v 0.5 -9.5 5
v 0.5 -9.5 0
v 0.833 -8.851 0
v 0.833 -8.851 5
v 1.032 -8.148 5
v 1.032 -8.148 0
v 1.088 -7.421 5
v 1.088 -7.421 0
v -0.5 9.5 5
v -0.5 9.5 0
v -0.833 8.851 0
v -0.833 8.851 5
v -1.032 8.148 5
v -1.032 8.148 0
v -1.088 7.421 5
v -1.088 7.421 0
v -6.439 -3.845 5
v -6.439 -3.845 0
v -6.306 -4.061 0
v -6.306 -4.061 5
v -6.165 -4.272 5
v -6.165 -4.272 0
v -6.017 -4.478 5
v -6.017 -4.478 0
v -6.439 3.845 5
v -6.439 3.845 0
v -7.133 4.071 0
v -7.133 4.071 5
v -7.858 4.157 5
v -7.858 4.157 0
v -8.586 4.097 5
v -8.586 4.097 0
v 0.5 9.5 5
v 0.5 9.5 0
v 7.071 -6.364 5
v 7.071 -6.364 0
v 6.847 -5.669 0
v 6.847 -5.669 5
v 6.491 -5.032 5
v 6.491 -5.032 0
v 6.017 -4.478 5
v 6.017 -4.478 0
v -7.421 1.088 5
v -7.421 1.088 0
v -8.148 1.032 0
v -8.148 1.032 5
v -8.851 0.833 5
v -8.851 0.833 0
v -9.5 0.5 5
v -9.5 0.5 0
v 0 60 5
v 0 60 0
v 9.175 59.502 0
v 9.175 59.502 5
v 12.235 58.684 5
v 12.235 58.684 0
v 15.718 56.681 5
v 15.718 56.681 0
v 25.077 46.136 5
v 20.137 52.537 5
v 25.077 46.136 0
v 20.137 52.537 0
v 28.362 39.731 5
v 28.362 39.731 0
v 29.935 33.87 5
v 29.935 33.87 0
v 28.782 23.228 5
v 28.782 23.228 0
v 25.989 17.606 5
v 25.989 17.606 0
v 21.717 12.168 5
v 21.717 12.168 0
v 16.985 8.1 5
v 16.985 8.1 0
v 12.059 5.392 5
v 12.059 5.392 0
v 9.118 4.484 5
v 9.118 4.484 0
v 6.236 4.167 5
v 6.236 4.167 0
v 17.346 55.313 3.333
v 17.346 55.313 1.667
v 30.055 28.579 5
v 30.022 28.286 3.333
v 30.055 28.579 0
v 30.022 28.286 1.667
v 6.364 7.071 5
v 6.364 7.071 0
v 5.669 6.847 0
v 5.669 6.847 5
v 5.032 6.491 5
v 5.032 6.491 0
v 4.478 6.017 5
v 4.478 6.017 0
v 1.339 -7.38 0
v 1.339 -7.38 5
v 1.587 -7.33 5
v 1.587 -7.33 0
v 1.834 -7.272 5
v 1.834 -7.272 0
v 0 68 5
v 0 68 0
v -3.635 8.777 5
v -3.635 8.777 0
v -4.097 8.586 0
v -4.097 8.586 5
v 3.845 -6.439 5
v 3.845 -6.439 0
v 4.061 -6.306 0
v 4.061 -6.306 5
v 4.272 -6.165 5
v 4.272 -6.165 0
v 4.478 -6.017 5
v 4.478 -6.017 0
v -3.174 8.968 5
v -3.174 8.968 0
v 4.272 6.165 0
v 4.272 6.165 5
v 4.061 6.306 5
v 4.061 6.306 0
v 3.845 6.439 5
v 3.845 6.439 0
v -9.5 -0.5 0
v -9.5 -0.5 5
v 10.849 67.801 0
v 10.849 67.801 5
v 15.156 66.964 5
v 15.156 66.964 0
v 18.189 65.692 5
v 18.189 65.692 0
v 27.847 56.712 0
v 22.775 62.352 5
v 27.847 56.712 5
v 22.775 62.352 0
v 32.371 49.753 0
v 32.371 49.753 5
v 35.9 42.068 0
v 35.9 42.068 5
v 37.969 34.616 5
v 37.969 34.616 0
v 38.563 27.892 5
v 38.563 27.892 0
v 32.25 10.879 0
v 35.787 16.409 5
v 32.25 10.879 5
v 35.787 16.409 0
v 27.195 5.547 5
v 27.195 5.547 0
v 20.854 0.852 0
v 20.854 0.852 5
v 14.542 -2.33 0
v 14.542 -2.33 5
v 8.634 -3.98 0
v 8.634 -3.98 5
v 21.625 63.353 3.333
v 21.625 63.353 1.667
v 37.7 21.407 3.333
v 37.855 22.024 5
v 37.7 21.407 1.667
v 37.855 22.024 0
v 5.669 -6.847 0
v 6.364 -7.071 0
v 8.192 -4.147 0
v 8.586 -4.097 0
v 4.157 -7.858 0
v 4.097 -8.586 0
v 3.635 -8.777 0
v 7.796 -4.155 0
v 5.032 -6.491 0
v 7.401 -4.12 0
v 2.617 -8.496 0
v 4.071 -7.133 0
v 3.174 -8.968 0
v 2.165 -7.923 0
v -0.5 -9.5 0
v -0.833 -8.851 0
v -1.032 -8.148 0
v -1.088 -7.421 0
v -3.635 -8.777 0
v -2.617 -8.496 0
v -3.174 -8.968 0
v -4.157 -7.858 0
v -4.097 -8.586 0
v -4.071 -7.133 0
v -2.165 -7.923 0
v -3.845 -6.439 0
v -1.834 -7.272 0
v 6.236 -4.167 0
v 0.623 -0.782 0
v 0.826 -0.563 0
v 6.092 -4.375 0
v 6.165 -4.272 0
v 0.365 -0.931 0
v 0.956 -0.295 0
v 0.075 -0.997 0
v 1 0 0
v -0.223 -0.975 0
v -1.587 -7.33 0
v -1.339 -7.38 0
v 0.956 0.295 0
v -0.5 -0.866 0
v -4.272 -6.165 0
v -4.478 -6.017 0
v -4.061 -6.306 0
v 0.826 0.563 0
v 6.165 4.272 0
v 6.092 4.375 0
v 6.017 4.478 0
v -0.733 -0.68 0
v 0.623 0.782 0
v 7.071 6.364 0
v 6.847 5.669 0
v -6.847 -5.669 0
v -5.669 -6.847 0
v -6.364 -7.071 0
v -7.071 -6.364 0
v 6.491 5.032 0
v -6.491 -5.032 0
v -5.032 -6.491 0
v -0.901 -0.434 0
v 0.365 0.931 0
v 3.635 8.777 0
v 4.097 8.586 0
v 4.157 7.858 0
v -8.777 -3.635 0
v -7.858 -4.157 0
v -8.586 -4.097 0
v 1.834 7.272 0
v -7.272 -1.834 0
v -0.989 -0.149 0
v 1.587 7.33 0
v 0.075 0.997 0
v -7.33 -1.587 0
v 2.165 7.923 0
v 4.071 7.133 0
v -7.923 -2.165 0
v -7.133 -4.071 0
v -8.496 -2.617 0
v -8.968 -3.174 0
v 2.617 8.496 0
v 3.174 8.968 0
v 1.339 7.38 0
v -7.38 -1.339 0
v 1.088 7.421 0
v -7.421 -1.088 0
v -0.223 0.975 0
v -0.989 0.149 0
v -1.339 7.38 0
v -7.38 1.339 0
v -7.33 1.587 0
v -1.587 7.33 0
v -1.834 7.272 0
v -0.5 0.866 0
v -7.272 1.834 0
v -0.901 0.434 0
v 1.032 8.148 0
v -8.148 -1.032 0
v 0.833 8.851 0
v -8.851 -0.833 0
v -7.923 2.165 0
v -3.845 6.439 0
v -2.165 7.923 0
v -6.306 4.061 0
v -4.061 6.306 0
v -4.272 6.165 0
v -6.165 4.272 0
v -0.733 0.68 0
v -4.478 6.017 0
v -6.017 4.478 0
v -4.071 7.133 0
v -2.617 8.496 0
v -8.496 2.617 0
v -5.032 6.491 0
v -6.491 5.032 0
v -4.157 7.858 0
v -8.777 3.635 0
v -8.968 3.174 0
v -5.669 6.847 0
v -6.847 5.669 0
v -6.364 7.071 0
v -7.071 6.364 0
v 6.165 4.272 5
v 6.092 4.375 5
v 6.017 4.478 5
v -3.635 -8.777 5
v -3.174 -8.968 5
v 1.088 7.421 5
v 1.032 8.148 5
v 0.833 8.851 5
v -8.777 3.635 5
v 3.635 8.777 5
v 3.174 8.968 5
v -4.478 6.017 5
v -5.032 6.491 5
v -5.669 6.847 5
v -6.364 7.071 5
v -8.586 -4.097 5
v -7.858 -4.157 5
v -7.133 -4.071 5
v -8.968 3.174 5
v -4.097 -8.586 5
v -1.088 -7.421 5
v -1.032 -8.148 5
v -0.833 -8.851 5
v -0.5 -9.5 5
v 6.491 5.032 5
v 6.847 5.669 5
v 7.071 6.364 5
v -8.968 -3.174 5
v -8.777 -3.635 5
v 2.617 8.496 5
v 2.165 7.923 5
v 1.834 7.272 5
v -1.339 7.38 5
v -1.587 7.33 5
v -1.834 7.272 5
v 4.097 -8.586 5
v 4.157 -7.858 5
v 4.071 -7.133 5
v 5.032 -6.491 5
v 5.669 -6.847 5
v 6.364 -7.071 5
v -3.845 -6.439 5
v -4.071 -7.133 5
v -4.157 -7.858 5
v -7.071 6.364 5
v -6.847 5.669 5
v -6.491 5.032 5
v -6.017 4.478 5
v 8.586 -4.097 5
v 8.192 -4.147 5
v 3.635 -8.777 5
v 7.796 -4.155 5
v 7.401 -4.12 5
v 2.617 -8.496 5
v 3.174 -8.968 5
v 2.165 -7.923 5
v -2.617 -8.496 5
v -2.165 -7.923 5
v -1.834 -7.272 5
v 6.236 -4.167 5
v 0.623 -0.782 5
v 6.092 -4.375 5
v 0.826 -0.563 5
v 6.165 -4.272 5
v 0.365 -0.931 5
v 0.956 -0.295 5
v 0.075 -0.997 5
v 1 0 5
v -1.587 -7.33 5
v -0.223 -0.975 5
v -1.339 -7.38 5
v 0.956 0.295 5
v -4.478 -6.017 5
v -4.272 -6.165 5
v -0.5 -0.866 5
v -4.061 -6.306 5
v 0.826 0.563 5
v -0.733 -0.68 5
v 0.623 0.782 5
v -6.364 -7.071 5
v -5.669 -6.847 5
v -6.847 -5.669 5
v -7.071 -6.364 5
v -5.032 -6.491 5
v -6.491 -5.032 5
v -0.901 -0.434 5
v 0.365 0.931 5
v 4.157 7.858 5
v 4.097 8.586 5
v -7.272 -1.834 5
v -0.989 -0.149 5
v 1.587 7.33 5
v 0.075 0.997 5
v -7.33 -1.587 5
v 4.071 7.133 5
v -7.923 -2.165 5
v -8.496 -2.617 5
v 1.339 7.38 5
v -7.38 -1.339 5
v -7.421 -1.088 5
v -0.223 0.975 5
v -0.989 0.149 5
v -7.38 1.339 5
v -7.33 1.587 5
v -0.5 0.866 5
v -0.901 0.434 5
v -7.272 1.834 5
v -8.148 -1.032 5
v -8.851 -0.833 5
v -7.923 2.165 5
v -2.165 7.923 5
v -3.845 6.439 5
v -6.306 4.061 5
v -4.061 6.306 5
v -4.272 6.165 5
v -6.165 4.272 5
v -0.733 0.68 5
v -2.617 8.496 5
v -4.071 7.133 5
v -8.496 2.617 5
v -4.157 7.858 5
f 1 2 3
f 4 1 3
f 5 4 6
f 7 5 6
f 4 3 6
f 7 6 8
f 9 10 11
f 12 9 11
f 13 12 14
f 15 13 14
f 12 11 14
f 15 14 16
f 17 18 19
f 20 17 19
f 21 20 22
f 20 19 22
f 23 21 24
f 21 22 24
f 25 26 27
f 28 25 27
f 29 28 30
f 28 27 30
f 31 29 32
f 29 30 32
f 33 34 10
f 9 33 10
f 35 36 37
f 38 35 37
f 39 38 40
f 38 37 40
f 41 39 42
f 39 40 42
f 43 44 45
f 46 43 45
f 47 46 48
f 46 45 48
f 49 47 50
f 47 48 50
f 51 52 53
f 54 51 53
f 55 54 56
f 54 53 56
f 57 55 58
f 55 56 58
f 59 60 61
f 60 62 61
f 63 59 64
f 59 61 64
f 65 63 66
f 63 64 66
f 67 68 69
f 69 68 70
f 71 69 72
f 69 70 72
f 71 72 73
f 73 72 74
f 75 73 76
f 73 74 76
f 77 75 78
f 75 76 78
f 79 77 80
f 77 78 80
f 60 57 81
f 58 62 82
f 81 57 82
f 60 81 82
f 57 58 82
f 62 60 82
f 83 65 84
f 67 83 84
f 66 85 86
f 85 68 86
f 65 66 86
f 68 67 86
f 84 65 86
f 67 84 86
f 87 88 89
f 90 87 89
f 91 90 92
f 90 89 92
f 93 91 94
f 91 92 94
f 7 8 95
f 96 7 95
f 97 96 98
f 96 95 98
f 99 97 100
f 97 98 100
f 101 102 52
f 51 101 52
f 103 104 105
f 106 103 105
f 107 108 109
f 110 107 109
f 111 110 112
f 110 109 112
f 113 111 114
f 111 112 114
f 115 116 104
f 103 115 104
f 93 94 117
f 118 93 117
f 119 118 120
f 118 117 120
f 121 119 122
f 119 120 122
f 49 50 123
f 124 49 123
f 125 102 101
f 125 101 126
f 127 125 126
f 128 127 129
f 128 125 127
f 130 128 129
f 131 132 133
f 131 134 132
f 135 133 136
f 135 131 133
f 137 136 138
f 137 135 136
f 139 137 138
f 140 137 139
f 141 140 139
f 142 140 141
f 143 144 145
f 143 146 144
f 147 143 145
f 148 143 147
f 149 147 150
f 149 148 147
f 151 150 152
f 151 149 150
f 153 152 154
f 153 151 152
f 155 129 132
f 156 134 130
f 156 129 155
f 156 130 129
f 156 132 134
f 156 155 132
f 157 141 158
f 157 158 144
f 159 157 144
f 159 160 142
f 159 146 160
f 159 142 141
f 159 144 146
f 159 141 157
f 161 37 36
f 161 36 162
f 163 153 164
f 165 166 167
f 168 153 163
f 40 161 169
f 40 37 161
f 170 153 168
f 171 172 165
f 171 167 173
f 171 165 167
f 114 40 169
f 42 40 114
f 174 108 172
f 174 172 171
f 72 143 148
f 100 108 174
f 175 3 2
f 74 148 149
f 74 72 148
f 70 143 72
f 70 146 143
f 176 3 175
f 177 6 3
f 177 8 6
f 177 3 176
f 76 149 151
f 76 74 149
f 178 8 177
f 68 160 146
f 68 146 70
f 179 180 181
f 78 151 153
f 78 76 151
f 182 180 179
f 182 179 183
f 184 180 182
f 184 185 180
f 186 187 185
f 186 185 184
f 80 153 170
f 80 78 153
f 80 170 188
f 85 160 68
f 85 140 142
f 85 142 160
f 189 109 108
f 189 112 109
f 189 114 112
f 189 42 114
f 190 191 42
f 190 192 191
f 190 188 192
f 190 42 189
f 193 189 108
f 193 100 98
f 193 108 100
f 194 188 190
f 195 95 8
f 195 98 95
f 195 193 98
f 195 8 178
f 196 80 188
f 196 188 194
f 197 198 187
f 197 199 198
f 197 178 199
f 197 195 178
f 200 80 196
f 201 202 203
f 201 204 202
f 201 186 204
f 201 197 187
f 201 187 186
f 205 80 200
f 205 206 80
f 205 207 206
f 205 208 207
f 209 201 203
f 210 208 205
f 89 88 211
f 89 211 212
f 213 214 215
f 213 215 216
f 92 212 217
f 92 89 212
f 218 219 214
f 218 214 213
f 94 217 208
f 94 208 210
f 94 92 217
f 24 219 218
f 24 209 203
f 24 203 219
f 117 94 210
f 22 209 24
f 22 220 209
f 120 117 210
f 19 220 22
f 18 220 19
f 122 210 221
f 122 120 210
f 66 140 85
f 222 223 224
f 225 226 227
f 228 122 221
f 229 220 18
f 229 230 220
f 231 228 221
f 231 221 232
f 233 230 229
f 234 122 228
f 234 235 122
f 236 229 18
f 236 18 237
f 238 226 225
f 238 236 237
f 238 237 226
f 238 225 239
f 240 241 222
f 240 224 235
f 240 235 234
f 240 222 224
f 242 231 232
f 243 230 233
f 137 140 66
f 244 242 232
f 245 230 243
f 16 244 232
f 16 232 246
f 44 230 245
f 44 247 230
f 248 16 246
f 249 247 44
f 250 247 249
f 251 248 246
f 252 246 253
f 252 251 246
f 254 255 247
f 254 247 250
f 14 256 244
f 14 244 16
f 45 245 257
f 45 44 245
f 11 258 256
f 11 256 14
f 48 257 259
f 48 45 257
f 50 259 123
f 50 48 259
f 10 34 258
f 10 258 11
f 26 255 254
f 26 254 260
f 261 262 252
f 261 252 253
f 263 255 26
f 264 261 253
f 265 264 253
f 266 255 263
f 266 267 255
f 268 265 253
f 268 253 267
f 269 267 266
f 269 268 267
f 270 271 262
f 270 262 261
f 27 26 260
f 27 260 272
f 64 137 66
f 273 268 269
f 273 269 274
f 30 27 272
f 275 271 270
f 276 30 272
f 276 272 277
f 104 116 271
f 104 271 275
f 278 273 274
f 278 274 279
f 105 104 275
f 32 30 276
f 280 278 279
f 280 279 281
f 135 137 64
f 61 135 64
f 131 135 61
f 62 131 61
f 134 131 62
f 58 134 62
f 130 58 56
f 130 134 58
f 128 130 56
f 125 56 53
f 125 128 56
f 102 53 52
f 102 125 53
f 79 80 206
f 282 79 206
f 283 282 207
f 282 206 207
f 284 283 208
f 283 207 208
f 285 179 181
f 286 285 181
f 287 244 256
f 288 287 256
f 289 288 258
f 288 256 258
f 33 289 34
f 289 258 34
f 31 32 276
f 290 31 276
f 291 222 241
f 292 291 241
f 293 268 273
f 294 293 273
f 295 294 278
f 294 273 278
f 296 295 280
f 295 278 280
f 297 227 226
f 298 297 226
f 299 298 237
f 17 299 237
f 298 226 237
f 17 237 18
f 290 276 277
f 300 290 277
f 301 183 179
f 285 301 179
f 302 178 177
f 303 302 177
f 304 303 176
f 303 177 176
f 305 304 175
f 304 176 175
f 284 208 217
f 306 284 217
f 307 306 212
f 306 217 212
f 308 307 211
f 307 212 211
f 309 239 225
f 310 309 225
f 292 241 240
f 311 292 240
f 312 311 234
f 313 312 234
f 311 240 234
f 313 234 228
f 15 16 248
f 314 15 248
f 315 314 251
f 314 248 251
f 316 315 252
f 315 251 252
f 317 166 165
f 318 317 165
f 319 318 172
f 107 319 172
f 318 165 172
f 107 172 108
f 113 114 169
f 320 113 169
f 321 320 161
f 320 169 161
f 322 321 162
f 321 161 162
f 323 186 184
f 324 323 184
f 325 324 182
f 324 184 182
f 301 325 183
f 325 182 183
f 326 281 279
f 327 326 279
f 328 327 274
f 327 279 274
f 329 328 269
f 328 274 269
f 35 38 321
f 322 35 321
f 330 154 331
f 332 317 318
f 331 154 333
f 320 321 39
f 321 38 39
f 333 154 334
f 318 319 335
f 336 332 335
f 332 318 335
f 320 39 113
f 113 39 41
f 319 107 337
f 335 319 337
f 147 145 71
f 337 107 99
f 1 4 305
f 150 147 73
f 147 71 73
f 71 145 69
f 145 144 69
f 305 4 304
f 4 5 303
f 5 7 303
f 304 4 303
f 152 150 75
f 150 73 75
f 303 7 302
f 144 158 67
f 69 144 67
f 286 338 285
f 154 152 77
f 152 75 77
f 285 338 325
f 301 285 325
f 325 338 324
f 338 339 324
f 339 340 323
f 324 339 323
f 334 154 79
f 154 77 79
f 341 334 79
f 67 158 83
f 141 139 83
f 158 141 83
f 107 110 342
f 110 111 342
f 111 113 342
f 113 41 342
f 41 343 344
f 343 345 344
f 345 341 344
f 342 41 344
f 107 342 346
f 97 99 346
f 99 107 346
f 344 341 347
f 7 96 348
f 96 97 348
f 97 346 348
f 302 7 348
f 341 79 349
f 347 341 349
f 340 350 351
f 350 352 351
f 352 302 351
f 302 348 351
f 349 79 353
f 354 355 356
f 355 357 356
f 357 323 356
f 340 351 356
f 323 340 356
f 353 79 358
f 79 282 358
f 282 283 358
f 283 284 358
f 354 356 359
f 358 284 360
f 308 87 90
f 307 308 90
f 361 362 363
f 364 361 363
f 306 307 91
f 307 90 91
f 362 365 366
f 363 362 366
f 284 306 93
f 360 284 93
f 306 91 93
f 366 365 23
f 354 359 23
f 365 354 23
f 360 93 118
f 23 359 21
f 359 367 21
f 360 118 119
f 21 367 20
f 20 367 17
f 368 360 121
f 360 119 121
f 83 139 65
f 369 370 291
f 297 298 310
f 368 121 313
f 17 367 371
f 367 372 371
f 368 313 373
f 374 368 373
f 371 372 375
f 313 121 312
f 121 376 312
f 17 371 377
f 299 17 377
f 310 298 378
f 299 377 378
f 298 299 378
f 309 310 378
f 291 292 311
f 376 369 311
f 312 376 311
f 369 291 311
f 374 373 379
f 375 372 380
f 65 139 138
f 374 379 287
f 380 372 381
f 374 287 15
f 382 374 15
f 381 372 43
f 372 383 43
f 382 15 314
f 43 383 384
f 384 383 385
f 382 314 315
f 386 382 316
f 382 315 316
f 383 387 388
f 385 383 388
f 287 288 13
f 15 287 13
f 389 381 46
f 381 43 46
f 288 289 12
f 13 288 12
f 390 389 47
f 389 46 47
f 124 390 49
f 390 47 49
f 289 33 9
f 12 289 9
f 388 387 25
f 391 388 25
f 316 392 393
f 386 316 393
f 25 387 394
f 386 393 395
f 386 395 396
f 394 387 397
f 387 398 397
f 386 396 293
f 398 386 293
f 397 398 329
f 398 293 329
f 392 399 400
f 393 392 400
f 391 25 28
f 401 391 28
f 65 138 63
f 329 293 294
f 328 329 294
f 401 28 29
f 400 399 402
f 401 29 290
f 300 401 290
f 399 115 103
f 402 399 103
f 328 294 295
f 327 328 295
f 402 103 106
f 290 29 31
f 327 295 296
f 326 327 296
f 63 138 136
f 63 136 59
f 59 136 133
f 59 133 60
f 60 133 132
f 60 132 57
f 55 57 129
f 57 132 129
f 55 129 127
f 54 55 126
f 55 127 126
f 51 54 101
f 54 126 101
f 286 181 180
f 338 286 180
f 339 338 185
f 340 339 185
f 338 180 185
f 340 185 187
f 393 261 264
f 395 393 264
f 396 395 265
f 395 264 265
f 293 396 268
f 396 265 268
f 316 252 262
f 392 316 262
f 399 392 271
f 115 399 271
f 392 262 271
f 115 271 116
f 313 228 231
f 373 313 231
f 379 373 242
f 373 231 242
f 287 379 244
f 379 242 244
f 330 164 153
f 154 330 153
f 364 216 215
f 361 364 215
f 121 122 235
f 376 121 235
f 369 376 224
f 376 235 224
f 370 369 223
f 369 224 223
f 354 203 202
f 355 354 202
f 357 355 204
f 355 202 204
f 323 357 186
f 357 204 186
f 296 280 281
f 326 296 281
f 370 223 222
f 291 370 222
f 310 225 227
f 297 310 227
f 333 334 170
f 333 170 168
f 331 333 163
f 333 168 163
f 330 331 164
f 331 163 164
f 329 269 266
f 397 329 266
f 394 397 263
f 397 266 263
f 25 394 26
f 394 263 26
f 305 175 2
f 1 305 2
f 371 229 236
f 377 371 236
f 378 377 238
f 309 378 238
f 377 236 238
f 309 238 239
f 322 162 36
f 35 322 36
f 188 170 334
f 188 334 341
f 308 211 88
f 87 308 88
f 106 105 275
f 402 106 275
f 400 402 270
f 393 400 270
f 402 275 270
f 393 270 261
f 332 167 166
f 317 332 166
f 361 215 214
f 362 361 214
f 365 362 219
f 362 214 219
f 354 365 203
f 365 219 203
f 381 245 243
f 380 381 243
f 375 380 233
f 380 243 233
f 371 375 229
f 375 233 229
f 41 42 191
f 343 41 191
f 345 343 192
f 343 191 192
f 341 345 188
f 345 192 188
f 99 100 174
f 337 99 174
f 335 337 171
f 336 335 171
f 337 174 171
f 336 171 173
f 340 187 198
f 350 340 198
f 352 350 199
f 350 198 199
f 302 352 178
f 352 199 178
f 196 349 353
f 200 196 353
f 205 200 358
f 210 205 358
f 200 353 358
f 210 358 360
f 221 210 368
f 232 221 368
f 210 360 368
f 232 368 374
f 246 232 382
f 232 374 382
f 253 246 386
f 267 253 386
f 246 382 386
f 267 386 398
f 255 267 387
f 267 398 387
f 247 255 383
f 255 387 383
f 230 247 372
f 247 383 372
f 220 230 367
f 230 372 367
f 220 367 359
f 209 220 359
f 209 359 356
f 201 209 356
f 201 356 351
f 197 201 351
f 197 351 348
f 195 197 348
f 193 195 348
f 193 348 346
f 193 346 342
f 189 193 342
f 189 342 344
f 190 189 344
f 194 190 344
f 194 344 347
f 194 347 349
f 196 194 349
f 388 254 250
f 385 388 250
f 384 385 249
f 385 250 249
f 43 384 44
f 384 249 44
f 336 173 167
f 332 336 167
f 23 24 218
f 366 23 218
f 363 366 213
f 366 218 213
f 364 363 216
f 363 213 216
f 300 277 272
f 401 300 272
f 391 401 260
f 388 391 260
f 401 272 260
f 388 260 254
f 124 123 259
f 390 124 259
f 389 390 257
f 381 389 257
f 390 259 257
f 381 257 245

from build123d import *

# Parameters (mm, degrees)
F1_DEPTH = 5
F2_R     = 1
F3_DEPTH = 25
F5_DEPTH = 5


with BuildPart() as f1:
    # F0 (on Top) → F1 (new body)
    with BuildSketch(Plane.XY):
        with BuildLine():
            ThreePointArc((7.4206173165, -1.0883191822), (7.4801280027, -0.5456052265), (7.5, 0))
            ThreePointArc((7.5, 0), (7.4801280027, 0.5456052265), (7.4206173165, 1.0883191822))
            ThreePointArc((7.4206173165, 1.0883191822), (7.355889603, 1.4631774151), (7.2722381774, 1.8342714877))
            ThreePointArc((7.2722381774, 1.8342714877), (6.9290964938, 2.8701257427), (6.4392747372, 3.8452231222))
            ThreePointArc((6.4392747372, 3.8452231222), (6.2360220923, 4.1667767476), (6.0167266989, 4.4776109513))
            ThreePointArc((6.0167266989, 4.4776109513), (5.3033008589, 5.3033008589), (4.4776109513, 6.0167266989))
            ThreePointArc((4.4776109513, 6.0167266989), (4.1667767476, 6.2360220923), (3.8452231222, 6.4392747372))
            ThreePointArc((3.8452231222, 6.4392747372), (2.8701257427, 6.9290964938), (1.8342714877, 7.2722381774))
            ThreePointArc((1.8342714877, 7.2722381774), (1.4631774151, 7.355889603), (1.0883191822, 7.4206173165))
            ThreePointArc((1.0883191822, 7.4206173165), (0, 7.5), (-1.0883191822, 7.4206173165))
            ThreePointArc((-1.0883191822, 7.4206173165), (-1.4631774151, 7.355889603), (-1.8342714877, 7.2722381774))
            ThreePointArc((-1.8342714877, 7.2722381774), (-2.8701257427, 6.9290964938), (-3.8452231222, 6.4392747372))
            ThreePointArc((-3.8452231222, 6.4392747372), (-4.1667767476, 6.2360220923), (-4.4776109513, 6.0167266989))
            ThreePointArc((-4.4776109513, 6.0167266989), (-5.3033008589, 5.3033008589), (-6.0167266989, 4.4776109513))
            ThreePointArc((-6.0167266989, 4.4776109513), (-6.2360220923, 4.1667767476), (-6.4392747372, 3.8452231222))
            ThreePointArc((-6.4392747372, 3.8452231222), (-6.9290964938, 2.8701257427), (-7.2722381774, 1.8342714877))
            ThreePointArc((-7.2722381774, 1.8342714877), (-7.355889603, 1.4631774151), (-7.4206173165, 1.0883191822))
            ThreePointArc((-7.4206173165, 1.0883191822), (-7.5, 0), (-7.4206173165, -1.0883191822))
            ThreePointArc((-7.4206173165, -1.0883191822), (-7.355889603, -1.4631774151), (-7.2722381774, -1.8342714877))
            ThreePointArc((-7.2722381774, -1.8342714877), (-6.9290964938, -2.8701257427), (-6.4392747372, -3.8452231222))
            ThreePointArc((-6.4392747372, -3.8452231222), (-6.2360220923, -4.1667767476), (-6.0167266989, -4.4776109513))
            ThreePointArc((-6.0167266989, -4.4776109513), (-5.3033008589, -5.3033008589), (-4.4776109513, -6.0167266989))
            ThreePointArc((-4.4776109513, -6.0167266989), (-4.1667767476, -6.2360220923), (-3.8452231222, -6.4392747372))
            ThreePointArc((-3.8452231222, -6.4392747372), (-2.8701257427, -6.9290964938), (-1.8342714877, -7.2722381774))
            ThreePointArc((-1.8342714877, -7.2722381774), (-1.4631774151, -7.355889603), (-1.0883191822, -7.4206173165))
            ThreePointArc((-1.0883191822, -7.4206173165), (0, -7.5), (1.0883191822, -7.4206173165))
            ThreePointArc((1.0883191822, -7.4206173165), (1.4631774151, -7.355889603), (1.8342714877, -7.2722381774))
            ThreePointArc((1.8342714877, -7.2722381774), (2.8701257427, -6.9290964938), (3.8452231222, -6.4392747372))
            ThreePointArc((3.8452231222, -6.4392747372), (4.1667767476, -6.2360220923), (4.4776109513, -6.0167266989))
            ThreePointArc((4.4776109513, -6.0167266989), (5.3033008589, -5.3033008589), (6.0167266989, -4.4776109513))
            ThreePointArc((6.0167266989, -4.4776109513), (6.2360220923, -4.1667767476), (6.4392747372, -3.8452231222))
            ThreePointArc((6.4392747372, -3.8452231222), (6.9290964938, -2.8701257427), (7.2722381774, -1.8342714877))
            ThreePointArc((7.2722381774, -1.8342714877), (7.355889603, -1.4631774151), (7.4206173165, -1.0883191822))
        make_face()
        with BuildLine():
            ThreePointArc((7.4206173165, 1.0883191822), (7.4801280027, 0.5456052265), (7.5, 0))
            ThreePointArc((7.5, 0), (7.4801280027, -0.5456052265), (7.4206173165, -1.0883191822))
            ThreePointArc((7.4206173165, -1.0883191822), (8.5043518229, -0.9498278009), (9.5, -0.5))
            Line((9.5, -0.5), (9.5, 0))
            Line((9.5, 0), (9.5, 0.5))
            ThreePointArc((9.5, 0.5), (8.5043518229, 0.9498278009), (7.4206173165, 1.0883191822))
        make_face()
        with BuildLine():
            ThreePointArc((6.4392747372, 3.8452231222), (6.9290964938, 2.8701257427), (7.2722381774, 1.8342714877))
            ThreePointArc((7.2722381774, 1.8342714877), (8.2204799494, 2.376948081), (8.968197275, 3.1735528412))
            Line((8.968197275, 3.1735528412), (8.7768555589, 3.6354926075))
            Line((8.7768555589, 3.6354926075), (8.5855138427, 4.0974323737))
            ThreePointArc((8.5855138427, 4.0974323737), (7.4935132234, 4.1320010103), (6.4392747372, 3.8452231222))
        make_face()
        with BuildLine():
            ThreePointArc((8.968197275, -3.1735528412), (8.2204799494, -2.376948081), (7.2722381774, -1.8342714877))
            ThreePointArc((7.2722381774, -1.8342714877), (6.9290964938, -2.8701257427), (6.4392747372, -3.8452231222))
            ThreePointArc((6.4392747372, -3.8452231222), (7.4935132234, -4.1320010103), (8.5855138427, -4.0974323737))
            Line((8.5855138427, -4.0974323737), (8.7768555589, -3.6354926075))
            Line((8.7768555589, -3.6354926075), (8.968197275, -3.1735528412))
        make_face()
        with BuildLine():
            ThreePointArc((4.4776109513, 6.0167266989), (5.3033008589, 5.3033008589), (6.0167266989, 4.4776109513))
            ThreePointArc((6.0167266989, 4.4776109513), (6.6851145225, 5.3418551646), (7.0710678119, 6.3639610307))
            Line((7.0710678119, 6.3639610307), (6.7175144213, 6.7175144213))
            Line((6.7175144213, 6.7175144213), (6.3639610307, 7.0710678119))
            ThreePointArc((6.3639610307, 7.0710678119), (5.3418551646, 6.6851145225), (4.4776109513, 6.0167266989))
        make_face()
        with BuildLine():
            ThreePointArc((7.0710678119, -6.3639610307), (6.6851145225, -5.3418551646), (6.0167266989, -4.4776109513))
            ThreePointArc((6.0167266989, -4.4776109513), (5.3033008589, -5.3033008589), (4.4776109513, -6.0167266989))
            ThreePointArc((4.4776109513, -6.0167266989), (5.3418551646, -6.6851145225), (6.3639610307, -7.0710678119))
            Line((6.3639610307, -7.0710678119), (6.7175144213, -6.7175144213))
            Line((6.7175144213, -6.7175144213), (7.0710678119, -6.3639610307))
        make_face()
        with BuildLine():
            ThreePointArc((1.8342714877, 7.2722381774), (2.8701257427, 6.9290964938), (3.8452231222, 6.4392747372))
            ThreePointArc((3.8452231222, 6.4392747372), (4.1320010103, 7.4935132234), (4.0974323737, 8.5855138427))
            Line((4.0974323737, 8.5855138427), (3.6354926075, 8.7768555589))
            Line((3.6354926075, 8.7768555589), (3.1735528412, 8.968197275))
            ThreePointArc((3.1735528412, 8.968197275), (2.376948081, 8.2204799494), (1.8342714877, 7.2722381774))
        make_face()
        with BuildLine():
            ThreePointArc((4.0974323737, -8.5855138427), (4.1320010103, -7.4935132234), (3.8452231222, -6.4392747372))
            ThreePointArc((3.8452231222, -6.4392747372), (2.8701257427, -6.9290964938), (1.8342714877, -7.2722381774))
            ThreePointArc((1.8342714877, -7.2722381774), (2.376948081, -8.2204799494), (3.1735528412, -8.968197275))
            Line((3.1735528412, -8.968197275), (3.6354926075, -8.7768555589))
            Line((3.6354926075, -8.7768555589), (4.0974323737, -8.5855138427))
        make_face()
        with BuildLine():
            ThreePointArc((-1.0883191822, 7.4206173165), (0, 7.5), (1.0883191822, 7.4206173165))
            ThreePointArc((1.0883191822, 7.4206173165), (0.9498278009, 8.5043518229), (0.5, 9.5))
            Line((0.5, 9.5), (0, 9.5))
            Line((0, 9.5), (-0.5, 9.5))
            ThreePointArc((-0.5, 9.5), (-0.9498278009, 8.5043518229), (-1.0883191822, 7.4206173165))
        make_face()
        with BuildLine():
            ThreePointArc((0.5, -9.5), (0.9498278009, -8.5043518229), (1.0883191822, -7.4206173165))
            ThreePointArc((1.0883191822, -7.4206173165), (0, -7.5), (-1.0883191822, -7.4206173165))
            ThreePointArc((-1.0883191822, -7.4206173165), (-0.9498278009, -8.5043518229), (-0.5, -9.5))
            Line((-0.5, -9.5), (0, -9.5))
            Line((0, -9.5), (0.5, -9.5))
        make_face()
        with BuildLine():
            ThreePointArc((-3.8452231222, 6.4392747372), (-2.8701257427, 6.9290964938), (-1.8342714877, 7.2722381774))
            ThreePointArc((-1.8342714877, 7.2722381774), (-2.376948081, 8.2204799494), (-3.1735528412, 8.968197275))
            Line((-3.1735528412, 8.968197275), (-3.6354926075, 8.7768555589))
            Line((-3.6354926075, 8.7768555589), (-4.0974323737, 8.5855138427))
            ThreePointArc((-4.0974323737, 8.5855138427), (-4.1320010103, 7.4935132234), (-3.8452231222, 6.4392747372))
        make_face()
        with BuildLine():
            ThreePointArc((-3.1735528412, -8.968197275), (-2.376948081, -8.2204799494), (-1.8342714877, -7.2722381774))
            ThreePointArc((-1.8342714877, -7.2722381774), (-2.8701257427, -6.9290964938), (-3.8452231222, -6.4392747372))
            ThreePointArc((-3.8452231222, -6.4392747372), (-4.1320010103, -7.4935132234), (-4.0974323737, -8.5855138427))
            Line((-4.0974323737, -8.5855138427), (-3.6354926075, -8.7768555589))
            Line((-3.6354926075, -8.7768555589), (-3.1735528412, -8.968197275))
        make_face()
        with BuildLine():
            ThreePointArc((-6.0167266989, 4.4776109513), (-5.3033008589, 5.3033008589), (-4.4776109513, 6.0167266989))
            ThreePointArc((-4.4776109513, 6.0167266989), (-5.3418551646, 6.6851145225), (-6.3639610307, 7.0710678119))
            Line((-6.3639610307, 7.0710678119), (-6.7175144213, 6.7175144213))
            Line((-6.7175144213, 6.7175144213), (-7.0710678119, 6.3639610307))
            ThreePointArc((-7.0710678119, 6.3639610307), (-6.6851145225, 5.3418551646), (-6.0167266989, 4.4776109513))
        make_face()
        with BuildLine():
            ThreePointArc((-6.3639610307, -7.0710678119), (-5.3418551646, -6.6851145225), (-4.4776109513, -6.0167266989))
            ThreePointArc((-4.4776109513, -6.0167266989), (-5.3033008589, -5.3033008589), (-6.0167266989, -4.4776109513))
            ThreePointArc((-6.0167266989, -4.4776109513), (-6.6851145225, -5.3418551646), (-7.0710678119, -6.3639610307))
            Line((-7.0710678119, -6.3639610307), (-6.7175144213, -6.7175144213))
            Line((-6.7175144213, -6.7175144213), (-6.3639610307, -7.0710678119))
        make_face()
        with BuildLine():
            ThreePointArc((-7.2722381774, 1.8342714877), (-6.9290964938, 2.8701257427), (-6.4392747372, 3.8452231222))
            ThreePointArc((-6.4392747372, 3.8452231222), (-7.4935132234, 4.1320010103), (-8.5855138427, 4.0974323737))
            Line((-8.5855138427, 4.0974323737), (-8.7768555589, 3.6354926075))
            Line((-8.7768555589, 3.6354926075), (-8.968197275, 3.1735528412))
            ThreePointArc((-8.968197275, 3.1735528412), (-8.2204799494, 2.376948081), (-7.2722381774, 1.8342714877))
        make_face()
        with BuildLine():
            ThreePointArc((-8.5855138427, -4.0974323737), (-7.4935132234, -4.1320010103), (-6.4392747372, -3.8452231222))
            ThreePointArc((-6.4392747372, -3.8452231222), (-6.9290964938, -2.8701257427), (-7.2722381774, -1.8342714877))
            ThreePointArc((-7.2722381774, -1.8342714877), (-8.2204799494, -2.376948081), (-8.968197275, -3.1735528412))
            Line((-8.968197275, -3.1735528412), (-8.7768555589, -3.6354926075))
            Line((-8.7768555589, -3.6354926075), (-8.5855138427, -4.0974323737))
        make_face()
        with BuildLine():
            ThreePointArc((-7.4206173165, -1.0883191822), (-7.5, 0), (-7.4206173165, 1.0883191822))
            ThreePointArc((-7.4206173165, 1.0883191822), (-8.5043518229, 0.9498278009), (-9.5, 0.5))
            Line((-9.5, 0.5), (-9.5, 0))
            Line((-9.5, 0), (-9.5, -0.5))
            ThreePointArc((-9.5, -0.5), (-8.5043518229, -0.9498278009), (-7.4206173165, -1.0883191822))
        make_face()
    extrude(amount=F1_DEPTH)

    # F2 (on face) → F3 (cut)
    with BuildSketch(Plane.XY.offset(5)):
        Circle(F2_R)
    extrude(amount=-F3_DEPTH, mode=Mode.SUBTRACT)

    # F4 (on Top) → F5 (join, through all)
    with BuildSketch(Plane.XY):
        with BuildLine():
            add(Edge.make_bspline(
                [(0, 68), (10, 68), (22.8391780148, 69.3882574213), (52.3463292726, 18.473927858), (16.2360203979, -4.1667756155), (6.2360203979, -4.1667756155)],
                knots=[0, 0, 0, 0, 0.2646192357, 0.6417248094, 1, 1, 1, 1], degree=3))
            Line((0, 68), (0, 60))
            add(Edge.make_bspline(
                [(0, 60), (10, 60), (16.6424524567, 58.4640557697), (40.1937230285, 27.9683773295), (16.2360220923, 4.1667767476), (6.2360220923, 4.1667767476)],
                knots=[0, 0, 0, 0, 0.273072818, 0.6250541396, 1, 1, 1, 1], degree=3))
            Line((6.2360220923, 4.1667767476), (6.2360203979, -4.1667756155))
        make_face()
    extrude(amount=F5_DEPTH)


solid = f1.part
